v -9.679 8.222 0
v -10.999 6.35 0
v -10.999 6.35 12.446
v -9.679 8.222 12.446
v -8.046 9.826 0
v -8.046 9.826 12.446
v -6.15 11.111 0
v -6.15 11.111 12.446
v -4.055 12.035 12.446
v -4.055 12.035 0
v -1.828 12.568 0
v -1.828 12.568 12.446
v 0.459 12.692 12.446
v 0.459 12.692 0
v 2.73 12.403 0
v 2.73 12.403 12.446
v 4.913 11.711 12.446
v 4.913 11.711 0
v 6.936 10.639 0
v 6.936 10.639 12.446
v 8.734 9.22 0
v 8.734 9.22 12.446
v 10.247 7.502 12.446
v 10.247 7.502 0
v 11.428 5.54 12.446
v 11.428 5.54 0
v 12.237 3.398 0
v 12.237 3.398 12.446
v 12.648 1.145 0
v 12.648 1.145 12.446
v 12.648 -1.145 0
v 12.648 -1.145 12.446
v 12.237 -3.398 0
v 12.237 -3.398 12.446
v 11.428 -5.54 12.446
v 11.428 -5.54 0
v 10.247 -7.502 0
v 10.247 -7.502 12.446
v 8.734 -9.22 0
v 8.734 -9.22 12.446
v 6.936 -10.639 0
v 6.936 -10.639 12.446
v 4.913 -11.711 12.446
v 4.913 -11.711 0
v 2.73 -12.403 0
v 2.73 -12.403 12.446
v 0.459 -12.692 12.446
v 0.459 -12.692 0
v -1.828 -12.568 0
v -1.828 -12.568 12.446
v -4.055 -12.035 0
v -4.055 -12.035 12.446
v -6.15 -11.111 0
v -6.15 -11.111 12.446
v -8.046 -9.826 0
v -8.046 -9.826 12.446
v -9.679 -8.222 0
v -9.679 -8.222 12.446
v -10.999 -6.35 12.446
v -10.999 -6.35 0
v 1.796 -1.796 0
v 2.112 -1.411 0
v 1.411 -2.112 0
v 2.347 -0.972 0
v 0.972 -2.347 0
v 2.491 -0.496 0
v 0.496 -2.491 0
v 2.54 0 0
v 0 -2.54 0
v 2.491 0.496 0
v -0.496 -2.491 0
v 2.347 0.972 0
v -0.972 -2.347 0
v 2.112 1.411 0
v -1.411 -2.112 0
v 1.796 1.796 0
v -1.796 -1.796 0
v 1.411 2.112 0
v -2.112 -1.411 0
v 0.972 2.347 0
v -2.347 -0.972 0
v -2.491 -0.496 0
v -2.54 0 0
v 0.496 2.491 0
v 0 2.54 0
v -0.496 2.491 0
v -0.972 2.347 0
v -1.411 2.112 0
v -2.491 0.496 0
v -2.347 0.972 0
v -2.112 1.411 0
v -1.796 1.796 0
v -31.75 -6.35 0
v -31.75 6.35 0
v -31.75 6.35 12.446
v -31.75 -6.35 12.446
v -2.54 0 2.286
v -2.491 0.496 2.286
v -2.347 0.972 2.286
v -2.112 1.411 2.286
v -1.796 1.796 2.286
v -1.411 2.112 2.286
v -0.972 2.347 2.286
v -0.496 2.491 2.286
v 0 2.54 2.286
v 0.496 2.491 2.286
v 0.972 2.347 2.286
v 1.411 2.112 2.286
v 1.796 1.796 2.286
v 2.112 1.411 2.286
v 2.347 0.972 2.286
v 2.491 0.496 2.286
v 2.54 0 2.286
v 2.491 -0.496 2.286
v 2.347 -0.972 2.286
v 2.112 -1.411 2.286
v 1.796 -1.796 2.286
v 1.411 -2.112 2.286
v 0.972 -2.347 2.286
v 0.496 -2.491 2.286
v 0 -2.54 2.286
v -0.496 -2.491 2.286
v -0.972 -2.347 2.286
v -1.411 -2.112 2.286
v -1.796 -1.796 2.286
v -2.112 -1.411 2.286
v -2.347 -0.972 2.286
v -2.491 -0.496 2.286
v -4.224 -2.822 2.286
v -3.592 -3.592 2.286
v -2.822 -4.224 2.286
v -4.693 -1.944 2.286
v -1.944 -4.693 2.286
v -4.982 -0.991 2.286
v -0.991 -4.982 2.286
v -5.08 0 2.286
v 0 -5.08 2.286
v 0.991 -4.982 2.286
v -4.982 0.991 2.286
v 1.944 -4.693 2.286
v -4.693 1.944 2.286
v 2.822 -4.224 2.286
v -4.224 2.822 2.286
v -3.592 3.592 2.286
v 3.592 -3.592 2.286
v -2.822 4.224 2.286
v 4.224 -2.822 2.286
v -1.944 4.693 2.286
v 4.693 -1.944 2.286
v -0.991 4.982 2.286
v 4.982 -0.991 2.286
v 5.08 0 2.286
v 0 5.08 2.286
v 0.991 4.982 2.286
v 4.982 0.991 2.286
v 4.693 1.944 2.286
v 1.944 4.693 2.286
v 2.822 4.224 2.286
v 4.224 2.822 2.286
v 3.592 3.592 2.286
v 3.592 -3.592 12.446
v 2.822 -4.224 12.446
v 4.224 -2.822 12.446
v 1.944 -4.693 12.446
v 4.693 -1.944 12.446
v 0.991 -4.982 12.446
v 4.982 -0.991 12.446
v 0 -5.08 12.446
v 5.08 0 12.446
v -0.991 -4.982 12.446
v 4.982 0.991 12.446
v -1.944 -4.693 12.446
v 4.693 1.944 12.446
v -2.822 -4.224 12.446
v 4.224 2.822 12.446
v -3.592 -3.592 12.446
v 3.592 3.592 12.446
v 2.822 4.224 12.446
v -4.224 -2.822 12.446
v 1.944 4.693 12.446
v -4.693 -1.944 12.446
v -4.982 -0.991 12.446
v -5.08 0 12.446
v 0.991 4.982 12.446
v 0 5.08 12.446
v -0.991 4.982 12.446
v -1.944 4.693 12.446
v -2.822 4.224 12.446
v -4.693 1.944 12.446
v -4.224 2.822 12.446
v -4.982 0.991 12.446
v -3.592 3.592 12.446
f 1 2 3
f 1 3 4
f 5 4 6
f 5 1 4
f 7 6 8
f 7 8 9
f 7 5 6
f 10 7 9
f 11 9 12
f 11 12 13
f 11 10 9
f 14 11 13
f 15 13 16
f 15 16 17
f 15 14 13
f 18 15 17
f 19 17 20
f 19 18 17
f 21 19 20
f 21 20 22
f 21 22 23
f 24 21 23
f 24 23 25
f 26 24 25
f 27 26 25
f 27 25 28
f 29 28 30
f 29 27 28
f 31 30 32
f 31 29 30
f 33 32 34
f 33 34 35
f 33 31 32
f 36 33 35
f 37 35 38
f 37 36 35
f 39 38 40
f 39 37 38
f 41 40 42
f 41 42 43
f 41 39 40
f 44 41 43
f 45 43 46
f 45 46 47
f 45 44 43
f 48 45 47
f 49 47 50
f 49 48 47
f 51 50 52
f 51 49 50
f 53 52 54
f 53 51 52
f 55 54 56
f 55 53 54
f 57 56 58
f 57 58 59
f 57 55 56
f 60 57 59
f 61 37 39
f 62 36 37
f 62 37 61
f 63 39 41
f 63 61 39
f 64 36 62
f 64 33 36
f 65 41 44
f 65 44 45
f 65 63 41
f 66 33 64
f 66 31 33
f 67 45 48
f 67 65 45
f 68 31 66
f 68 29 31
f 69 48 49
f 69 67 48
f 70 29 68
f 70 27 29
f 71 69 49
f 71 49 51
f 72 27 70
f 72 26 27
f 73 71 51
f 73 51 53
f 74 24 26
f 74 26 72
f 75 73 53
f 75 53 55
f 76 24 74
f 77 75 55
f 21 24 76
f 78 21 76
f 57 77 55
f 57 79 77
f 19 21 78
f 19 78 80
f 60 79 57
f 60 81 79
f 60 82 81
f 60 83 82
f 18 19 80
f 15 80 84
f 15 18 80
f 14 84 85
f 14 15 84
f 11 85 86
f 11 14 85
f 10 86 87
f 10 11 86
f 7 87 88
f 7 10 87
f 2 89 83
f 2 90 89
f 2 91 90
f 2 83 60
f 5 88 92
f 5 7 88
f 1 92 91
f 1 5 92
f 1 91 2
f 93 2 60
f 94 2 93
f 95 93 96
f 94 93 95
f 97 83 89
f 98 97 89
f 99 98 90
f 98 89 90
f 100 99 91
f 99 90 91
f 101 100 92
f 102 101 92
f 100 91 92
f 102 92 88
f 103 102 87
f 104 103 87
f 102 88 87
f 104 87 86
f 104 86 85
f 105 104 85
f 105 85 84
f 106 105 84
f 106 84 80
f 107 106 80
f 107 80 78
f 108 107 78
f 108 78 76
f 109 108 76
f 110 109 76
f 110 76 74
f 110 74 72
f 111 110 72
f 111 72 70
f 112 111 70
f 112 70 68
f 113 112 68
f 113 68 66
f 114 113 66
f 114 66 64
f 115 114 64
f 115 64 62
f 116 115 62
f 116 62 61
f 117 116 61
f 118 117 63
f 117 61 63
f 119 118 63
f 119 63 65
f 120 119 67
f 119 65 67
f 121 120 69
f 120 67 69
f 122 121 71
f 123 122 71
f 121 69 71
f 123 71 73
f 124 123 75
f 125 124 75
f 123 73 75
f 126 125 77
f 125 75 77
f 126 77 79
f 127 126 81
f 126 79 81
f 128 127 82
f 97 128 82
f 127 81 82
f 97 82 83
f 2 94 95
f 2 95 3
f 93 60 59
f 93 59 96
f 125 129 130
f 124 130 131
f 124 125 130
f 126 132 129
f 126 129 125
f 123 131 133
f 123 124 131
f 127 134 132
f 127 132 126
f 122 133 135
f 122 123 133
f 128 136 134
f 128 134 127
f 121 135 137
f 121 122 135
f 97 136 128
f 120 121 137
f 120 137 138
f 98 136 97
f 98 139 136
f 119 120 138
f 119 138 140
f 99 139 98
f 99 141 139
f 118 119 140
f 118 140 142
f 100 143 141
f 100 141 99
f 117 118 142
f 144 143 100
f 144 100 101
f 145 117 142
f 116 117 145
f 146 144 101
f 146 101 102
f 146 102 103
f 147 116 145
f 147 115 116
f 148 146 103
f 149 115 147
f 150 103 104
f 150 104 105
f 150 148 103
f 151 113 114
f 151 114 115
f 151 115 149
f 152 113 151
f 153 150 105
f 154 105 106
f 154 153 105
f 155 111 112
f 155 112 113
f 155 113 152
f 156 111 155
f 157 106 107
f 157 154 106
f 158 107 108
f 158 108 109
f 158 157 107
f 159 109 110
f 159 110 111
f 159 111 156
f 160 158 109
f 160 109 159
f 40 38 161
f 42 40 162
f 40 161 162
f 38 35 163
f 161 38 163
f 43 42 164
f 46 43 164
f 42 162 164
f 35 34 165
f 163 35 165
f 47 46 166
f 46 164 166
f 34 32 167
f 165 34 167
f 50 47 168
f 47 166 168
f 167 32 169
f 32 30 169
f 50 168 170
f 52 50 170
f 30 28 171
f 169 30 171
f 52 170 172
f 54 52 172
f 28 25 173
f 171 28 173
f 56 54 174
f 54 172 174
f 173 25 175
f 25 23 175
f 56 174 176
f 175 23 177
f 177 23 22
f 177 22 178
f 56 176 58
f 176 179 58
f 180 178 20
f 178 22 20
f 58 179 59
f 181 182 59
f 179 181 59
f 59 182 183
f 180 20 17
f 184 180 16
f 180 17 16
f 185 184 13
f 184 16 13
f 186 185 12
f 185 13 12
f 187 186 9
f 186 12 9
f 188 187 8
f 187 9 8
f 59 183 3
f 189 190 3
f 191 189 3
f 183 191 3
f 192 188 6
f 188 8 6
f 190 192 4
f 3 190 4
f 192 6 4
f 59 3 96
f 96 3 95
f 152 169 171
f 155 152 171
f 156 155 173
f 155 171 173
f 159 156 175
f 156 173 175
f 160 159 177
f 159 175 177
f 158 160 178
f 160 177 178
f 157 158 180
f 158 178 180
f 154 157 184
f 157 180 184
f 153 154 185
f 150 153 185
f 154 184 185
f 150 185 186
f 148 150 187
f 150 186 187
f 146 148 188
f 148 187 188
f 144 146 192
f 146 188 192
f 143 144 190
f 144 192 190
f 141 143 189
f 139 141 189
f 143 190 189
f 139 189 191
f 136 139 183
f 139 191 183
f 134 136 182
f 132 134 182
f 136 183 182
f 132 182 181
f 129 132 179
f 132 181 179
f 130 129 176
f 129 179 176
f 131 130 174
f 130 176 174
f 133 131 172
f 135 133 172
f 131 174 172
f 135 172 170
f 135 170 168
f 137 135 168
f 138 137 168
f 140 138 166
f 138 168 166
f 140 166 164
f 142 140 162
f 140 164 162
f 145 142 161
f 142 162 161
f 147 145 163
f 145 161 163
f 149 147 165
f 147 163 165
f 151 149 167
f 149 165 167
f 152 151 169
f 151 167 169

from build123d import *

# Parameters (mm, degrees)
BOSS_EXTRUDE2_DEPTH = 12.446
SKETCH4_R           = 2.54
CUT_EXTRUDE1_DEPTH  = 13.446
SKETCH5_R           = 5.08
CUT_EXTRUDE2_DEPTH  = 10.16


with BuildPart() as part:
    # Sketch3 → Boss-Extrude2 (new body)
    with BuildSketch(Plane.XY):
        with BuildLine():
            Line((-10.998522628, -6.35), (-19.05, -6.35))
            Line((-19.05, -6.35), (-31.75, -6.35))
            Line((-31.75, -6.35), (-31.75, 6.35))
            Line((-31.75, 6.35), (-19.05, 6.35))
            Line((-19.05, 6.35), (-10.998522628, 6.35))
            ThreePointArc((-10.998522628, 6.35), (12.7, 0), (-10.998522628, -6.35))
        make_face()
    extrude(amount=BOSS_EXTRUDE2_DEPTH)

    # Sketch4 → Cut-Extrude1 (cut, through all)
    with BuildSketch(Plane(origin=(0, 0, 0), x_dir=(-1, 0, 0), z_dir=(0, 0, -1))):
        Circle(SKETCH4_R)
    extrude(amount=-CUT_EXTRUDE1_DEPTH, mode=Mode.SUBTRACT)

    # Sketch5 → Cut-Extrude2 (cut)
    with BuildSketch(Plane.XY.offset(12.446)):
        Circle(SKETCH5_R)
    extrude(amount=-CUT_EXTRUDE2_DEPTH, mode=Mode.SUBTRACT)


solid = part.part
